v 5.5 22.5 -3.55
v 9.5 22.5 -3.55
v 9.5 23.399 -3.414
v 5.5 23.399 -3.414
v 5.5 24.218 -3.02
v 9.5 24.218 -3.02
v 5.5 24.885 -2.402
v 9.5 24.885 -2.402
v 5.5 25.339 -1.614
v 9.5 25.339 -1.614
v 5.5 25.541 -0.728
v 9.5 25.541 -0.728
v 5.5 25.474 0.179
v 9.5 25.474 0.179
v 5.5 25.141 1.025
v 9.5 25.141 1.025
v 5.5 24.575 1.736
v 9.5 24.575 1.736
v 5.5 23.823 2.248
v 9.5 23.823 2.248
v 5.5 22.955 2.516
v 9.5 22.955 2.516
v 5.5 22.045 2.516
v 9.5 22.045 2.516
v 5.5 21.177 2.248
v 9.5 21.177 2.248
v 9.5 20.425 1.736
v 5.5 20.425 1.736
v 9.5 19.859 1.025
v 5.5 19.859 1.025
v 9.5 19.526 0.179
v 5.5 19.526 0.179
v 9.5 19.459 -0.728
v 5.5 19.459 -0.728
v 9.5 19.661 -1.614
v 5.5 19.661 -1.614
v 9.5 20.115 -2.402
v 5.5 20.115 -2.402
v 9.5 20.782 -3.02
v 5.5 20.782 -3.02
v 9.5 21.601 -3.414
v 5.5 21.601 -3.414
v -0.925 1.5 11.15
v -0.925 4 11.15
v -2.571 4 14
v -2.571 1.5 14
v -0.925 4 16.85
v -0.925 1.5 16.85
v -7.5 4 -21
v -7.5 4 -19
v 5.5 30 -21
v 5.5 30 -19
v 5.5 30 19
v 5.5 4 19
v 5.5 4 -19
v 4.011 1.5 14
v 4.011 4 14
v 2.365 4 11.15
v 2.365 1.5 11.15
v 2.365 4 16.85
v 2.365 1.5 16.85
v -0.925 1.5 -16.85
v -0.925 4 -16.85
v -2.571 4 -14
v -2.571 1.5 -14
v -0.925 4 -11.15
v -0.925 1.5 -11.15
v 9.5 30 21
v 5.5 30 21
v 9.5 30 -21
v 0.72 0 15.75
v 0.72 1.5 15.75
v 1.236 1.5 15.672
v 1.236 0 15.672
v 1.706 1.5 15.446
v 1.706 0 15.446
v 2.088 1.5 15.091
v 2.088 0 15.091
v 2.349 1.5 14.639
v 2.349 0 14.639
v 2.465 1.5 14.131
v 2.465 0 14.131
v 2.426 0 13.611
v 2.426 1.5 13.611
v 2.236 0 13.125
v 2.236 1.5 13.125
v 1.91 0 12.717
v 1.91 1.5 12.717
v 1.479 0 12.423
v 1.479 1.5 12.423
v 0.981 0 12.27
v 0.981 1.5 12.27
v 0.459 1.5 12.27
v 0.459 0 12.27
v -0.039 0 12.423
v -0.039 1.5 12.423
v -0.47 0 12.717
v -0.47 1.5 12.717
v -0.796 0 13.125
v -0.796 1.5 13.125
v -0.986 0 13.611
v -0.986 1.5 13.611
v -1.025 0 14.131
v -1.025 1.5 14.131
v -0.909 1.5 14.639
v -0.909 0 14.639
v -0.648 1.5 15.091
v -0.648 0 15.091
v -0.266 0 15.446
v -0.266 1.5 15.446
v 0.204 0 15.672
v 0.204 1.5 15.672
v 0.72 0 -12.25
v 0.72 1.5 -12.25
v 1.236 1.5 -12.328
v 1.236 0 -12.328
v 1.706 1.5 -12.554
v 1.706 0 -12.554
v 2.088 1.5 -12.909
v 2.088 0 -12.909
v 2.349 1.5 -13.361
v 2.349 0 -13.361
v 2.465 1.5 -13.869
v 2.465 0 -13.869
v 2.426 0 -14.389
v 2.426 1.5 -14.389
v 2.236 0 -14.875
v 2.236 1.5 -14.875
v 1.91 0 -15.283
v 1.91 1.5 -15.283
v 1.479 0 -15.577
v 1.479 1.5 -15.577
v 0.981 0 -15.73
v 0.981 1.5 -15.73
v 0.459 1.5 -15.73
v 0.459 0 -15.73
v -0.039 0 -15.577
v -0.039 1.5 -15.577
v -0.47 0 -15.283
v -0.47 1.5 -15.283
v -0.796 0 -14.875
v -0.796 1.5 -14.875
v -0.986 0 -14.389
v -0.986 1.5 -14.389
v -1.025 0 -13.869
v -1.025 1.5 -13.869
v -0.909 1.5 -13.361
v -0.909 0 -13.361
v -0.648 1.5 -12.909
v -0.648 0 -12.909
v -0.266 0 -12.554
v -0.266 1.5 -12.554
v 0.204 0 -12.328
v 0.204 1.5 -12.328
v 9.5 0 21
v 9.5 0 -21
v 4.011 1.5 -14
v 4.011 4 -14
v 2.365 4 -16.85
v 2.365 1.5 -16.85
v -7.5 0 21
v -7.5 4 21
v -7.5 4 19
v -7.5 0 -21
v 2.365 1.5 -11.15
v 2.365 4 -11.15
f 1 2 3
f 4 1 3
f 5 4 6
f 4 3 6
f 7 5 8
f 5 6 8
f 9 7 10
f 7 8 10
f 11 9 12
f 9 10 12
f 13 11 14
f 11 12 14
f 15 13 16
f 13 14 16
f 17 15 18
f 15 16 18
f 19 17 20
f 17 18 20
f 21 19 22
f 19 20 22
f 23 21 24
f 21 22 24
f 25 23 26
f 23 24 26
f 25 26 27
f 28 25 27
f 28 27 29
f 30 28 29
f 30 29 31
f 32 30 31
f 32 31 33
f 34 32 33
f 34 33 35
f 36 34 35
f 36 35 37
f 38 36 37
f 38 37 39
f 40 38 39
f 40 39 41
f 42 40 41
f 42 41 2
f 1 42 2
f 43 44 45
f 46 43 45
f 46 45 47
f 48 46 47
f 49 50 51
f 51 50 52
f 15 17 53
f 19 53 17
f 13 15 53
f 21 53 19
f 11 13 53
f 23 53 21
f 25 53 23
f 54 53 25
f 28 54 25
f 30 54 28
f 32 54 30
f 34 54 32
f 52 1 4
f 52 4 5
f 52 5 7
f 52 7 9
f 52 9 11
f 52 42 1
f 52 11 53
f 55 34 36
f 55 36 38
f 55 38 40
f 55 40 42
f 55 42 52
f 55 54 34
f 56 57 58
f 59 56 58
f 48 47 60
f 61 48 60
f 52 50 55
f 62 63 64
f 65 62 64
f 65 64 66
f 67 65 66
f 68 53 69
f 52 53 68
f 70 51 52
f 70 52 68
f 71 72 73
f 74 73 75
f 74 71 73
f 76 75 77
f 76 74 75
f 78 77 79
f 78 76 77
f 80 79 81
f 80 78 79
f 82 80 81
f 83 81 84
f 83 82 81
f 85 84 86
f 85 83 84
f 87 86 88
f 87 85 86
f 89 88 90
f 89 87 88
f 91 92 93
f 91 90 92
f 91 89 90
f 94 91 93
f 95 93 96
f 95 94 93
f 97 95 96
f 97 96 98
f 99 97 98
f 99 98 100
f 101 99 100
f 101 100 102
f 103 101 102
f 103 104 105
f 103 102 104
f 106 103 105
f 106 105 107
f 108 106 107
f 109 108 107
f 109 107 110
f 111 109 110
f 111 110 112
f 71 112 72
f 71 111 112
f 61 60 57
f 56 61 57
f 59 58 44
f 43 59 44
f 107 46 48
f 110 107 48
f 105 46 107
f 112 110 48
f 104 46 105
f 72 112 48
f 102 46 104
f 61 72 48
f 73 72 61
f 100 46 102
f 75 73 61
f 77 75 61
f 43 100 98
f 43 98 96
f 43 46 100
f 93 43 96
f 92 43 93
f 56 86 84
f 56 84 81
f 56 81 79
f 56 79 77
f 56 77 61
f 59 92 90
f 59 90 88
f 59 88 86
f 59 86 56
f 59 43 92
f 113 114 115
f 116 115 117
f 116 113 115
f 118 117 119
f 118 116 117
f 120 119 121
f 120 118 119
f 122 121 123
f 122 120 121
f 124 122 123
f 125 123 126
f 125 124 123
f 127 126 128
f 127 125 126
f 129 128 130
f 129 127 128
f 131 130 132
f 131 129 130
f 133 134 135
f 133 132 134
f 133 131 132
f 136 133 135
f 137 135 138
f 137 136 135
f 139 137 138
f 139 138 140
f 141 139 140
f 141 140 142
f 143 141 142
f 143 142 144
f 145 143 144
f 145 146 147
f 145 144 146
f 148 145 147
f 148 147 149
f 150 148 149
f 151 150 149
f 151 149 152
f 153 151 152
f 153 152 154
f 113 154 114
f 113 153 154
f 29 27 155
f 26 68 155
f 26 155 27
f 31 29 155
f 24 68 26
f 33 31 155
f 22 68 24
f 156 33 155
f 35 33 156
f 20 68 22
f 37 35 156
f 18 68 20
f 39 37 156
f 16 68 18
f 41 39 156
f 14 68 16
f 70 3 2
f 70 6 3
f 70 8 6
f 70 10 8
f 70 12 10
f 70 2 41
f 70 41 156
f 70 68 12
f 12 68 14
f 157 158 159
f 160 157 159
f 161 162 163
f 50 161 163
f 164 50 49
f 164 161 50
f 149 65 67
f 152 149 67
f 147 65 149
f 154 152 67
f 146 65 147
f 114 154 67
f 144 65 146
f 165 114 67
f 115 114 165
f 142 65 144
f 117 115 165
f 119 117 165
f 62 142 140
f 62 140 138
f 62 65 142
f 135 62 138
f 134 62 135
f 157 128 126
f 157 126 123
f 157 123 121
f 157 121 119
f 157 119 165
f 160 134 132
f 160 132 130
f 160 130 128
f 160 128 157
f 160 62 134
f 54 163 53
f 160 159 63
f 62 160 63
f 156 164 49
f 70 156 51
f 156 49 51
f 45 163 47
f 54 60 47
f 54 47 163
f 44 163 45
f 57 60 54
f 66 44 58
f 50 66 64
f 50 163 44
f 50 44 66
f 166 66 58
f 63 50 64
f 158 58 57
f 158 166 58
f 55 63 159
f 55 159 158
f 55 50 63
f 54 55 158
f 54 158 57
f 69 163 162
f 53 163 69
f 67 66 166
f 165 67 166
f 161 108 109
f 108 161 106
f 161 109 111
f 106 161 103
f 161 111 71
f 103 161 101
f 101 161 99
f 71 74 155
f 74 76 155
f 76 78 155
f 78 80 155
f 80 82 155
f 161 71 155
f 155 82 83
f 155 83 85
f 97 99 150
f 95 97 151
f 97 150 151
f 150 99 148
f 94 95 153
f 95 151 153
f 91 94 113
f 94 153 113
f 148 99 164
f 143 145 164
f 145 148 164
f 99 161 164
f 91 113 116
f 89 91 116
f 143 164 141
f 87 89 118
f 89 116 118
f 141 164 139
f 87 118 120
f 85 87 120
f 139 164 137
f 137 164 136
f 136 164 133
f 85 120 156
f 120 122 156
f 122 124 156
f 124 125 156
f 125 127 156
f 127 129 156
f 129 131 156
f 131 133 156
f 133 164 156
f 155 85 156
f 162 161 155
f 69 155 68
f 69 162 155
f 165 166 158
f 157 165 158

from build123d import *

# Parameters (mm, degrees)
SKETCH1_W                = 13
SKETCH1_H                = 42
SKETCH1_R                = 1.75
BOSS_EXTRUDE1_DEPTH      = 4
SKETCH1_3_W              = 2
SKETCH1_3_H              = 42
BOSS_EXTRUDE2_DEPTH      = 30
SKETCH3_R                = 3.1
CUT_EXTRUDE1_DEPTH       = 50
RIB1_REACH               = 54.156
SKETCH4_WALL_W           = 135.380915612
SKETCH4_WALL_H           = 2
CUT_EXTRUDE2_DEPTH       = 2.5
BOSS_EXTRUDE3_DEPTH      = 2
BOSS_EXTRUDE3_DEPTH_BACK = 2
SKETCH7_W                = 42
SKETCH7_H                = 30
SKETCH8_R                = 3.05
CUT_EXTRUDE3_DEPTH       = 12


with BuildPart() as part:
    # Sketch1 → Boss-Extrude1 (new body)
    with BuildSketch(Plane(origin=(0, 0, 0), x_dir=(1, 0, 0), z_dir=(0, 1, 0))):
        with Locations((-1, 0)):
            Rectangle(SKETCH1_W, SKETCH1_H)
        with Locations((0.72, -14)):
            Circle(SKETCH1_R, mode=Mode.SUBTRACT)
        with Locations((0.72, 14)):
            Circle(SKETCH1_R, mode=Mode.SUBTRACT)
    extrude(amount=BOSS_EXTRUDE1_DEPTH)

    # Sketch1<3> → Boss-Extrude2 (add)
    with BuildSketch(Plane(origin=(0, 0, 0), x_dir=(1, 0, 0), z_dir=(0, 1, 0))):
        with Locations((6.5, 0)):
            Rectangle(SKETCH1_3_W, SKETCH1_3_H)
    extrude(amount=BOSS_EXTRUDE2_DEPTH)

    # Sketch3 → Cut-Extrude1 (cut)
    with BuildSketch(Plane(origin=(7.5, 0, 0), x_dir=(0, 0, -1), z_dir=(1, 0, 0))):
        with Locations((0, 22.5)):
            Circle(SKETCH3_R)
    extrude(amount=-CUT_EXTRUDE1_DEPTH, mode=Mode.SUBTRACT)

    # Sketch4 wall → Rib1 (add, up to next)
    with BuildSketch(Plane(origin=(-1, 17, 21), x_dir=(0.4472135955, 0.894427191, 0), z_dir=(-0.894427191, 0.4472135955, 0)), mode=Mode.PRIVATE) as rib1_sk1:
        with Locations((0, 1)):
            Rectangle(SKETCH4_WALL_W, SKETCH4_WALL_H)
    rib1_tool1 = extrude(rib1_sk1.sketch, amount=-RIB1_REACH, mode=Mode.PRIVATE) - part.part
    rib1 = rib1_tool1.solids().sort_by_distance((-1, 17, 21))[0]
    add(rib1)

    # Mirror1: Rib1 across plane
    add(rib1.mirror(Plane.XY))

    # Sketch6 → Cut-Extrude2 (cut)
    with BuildSketch(Plane(origin=(0, 4, 0), x_dir=(1, 0, 0), z_dir=(0, 1, 0))):
        Polygon((-2.570896534, -14), (-0.925448267, -16.85), (2.365448267, -16.85), (4.010896534, -14), (2.365448267, -11.15), (-0.925448267, -11.15), align=None)
        Polygon((-2.570896534, 14), (-0.925448267, 11.15), (2.365448267, 11.15), (4.010896534, 14), (2.365448267, 16.85), (-0.925448267, 16.85), align=None)
    extrude(amount=-CUT_EXTRUDE2_DEPTH, mode=Mode.SUBTRACT)

    # Sketch7 → Boss-Extrude3 (add, two sides: drawn at the far end of the back side and taken through both)
    with BuildSketch(Plane(origin=(7.5, 0, 0), x_dir=(0, 0, -1), z_dir=(1, 0, 0)).offset(-BOSS_EXTRUDE3_DEPTH_BACK)):
        with Locations((0, 15)):
            Rectangle(SKETCH7_W, SKETCH7_H)
    extrude(amount=BOSS_EXTRUDE3_DEPTH + BOSS_EXTRUDE3_DEPTH_BACK)

    # Sketch8 → Cut-Extrude3 (cut)
    with BuildSketch(Plane(origin=(9.5, 0, 0), x_dir=(0, 0, -1), z_dir=(1, 0, 0))):
        with Locations((0.5, 22.5)):
            Circle(SKETCH8_R)
    extrude(amount=-CUT_EXTRUDE3_DEPTH, mode=Mode.SUBTRACT)


solid = part.part
